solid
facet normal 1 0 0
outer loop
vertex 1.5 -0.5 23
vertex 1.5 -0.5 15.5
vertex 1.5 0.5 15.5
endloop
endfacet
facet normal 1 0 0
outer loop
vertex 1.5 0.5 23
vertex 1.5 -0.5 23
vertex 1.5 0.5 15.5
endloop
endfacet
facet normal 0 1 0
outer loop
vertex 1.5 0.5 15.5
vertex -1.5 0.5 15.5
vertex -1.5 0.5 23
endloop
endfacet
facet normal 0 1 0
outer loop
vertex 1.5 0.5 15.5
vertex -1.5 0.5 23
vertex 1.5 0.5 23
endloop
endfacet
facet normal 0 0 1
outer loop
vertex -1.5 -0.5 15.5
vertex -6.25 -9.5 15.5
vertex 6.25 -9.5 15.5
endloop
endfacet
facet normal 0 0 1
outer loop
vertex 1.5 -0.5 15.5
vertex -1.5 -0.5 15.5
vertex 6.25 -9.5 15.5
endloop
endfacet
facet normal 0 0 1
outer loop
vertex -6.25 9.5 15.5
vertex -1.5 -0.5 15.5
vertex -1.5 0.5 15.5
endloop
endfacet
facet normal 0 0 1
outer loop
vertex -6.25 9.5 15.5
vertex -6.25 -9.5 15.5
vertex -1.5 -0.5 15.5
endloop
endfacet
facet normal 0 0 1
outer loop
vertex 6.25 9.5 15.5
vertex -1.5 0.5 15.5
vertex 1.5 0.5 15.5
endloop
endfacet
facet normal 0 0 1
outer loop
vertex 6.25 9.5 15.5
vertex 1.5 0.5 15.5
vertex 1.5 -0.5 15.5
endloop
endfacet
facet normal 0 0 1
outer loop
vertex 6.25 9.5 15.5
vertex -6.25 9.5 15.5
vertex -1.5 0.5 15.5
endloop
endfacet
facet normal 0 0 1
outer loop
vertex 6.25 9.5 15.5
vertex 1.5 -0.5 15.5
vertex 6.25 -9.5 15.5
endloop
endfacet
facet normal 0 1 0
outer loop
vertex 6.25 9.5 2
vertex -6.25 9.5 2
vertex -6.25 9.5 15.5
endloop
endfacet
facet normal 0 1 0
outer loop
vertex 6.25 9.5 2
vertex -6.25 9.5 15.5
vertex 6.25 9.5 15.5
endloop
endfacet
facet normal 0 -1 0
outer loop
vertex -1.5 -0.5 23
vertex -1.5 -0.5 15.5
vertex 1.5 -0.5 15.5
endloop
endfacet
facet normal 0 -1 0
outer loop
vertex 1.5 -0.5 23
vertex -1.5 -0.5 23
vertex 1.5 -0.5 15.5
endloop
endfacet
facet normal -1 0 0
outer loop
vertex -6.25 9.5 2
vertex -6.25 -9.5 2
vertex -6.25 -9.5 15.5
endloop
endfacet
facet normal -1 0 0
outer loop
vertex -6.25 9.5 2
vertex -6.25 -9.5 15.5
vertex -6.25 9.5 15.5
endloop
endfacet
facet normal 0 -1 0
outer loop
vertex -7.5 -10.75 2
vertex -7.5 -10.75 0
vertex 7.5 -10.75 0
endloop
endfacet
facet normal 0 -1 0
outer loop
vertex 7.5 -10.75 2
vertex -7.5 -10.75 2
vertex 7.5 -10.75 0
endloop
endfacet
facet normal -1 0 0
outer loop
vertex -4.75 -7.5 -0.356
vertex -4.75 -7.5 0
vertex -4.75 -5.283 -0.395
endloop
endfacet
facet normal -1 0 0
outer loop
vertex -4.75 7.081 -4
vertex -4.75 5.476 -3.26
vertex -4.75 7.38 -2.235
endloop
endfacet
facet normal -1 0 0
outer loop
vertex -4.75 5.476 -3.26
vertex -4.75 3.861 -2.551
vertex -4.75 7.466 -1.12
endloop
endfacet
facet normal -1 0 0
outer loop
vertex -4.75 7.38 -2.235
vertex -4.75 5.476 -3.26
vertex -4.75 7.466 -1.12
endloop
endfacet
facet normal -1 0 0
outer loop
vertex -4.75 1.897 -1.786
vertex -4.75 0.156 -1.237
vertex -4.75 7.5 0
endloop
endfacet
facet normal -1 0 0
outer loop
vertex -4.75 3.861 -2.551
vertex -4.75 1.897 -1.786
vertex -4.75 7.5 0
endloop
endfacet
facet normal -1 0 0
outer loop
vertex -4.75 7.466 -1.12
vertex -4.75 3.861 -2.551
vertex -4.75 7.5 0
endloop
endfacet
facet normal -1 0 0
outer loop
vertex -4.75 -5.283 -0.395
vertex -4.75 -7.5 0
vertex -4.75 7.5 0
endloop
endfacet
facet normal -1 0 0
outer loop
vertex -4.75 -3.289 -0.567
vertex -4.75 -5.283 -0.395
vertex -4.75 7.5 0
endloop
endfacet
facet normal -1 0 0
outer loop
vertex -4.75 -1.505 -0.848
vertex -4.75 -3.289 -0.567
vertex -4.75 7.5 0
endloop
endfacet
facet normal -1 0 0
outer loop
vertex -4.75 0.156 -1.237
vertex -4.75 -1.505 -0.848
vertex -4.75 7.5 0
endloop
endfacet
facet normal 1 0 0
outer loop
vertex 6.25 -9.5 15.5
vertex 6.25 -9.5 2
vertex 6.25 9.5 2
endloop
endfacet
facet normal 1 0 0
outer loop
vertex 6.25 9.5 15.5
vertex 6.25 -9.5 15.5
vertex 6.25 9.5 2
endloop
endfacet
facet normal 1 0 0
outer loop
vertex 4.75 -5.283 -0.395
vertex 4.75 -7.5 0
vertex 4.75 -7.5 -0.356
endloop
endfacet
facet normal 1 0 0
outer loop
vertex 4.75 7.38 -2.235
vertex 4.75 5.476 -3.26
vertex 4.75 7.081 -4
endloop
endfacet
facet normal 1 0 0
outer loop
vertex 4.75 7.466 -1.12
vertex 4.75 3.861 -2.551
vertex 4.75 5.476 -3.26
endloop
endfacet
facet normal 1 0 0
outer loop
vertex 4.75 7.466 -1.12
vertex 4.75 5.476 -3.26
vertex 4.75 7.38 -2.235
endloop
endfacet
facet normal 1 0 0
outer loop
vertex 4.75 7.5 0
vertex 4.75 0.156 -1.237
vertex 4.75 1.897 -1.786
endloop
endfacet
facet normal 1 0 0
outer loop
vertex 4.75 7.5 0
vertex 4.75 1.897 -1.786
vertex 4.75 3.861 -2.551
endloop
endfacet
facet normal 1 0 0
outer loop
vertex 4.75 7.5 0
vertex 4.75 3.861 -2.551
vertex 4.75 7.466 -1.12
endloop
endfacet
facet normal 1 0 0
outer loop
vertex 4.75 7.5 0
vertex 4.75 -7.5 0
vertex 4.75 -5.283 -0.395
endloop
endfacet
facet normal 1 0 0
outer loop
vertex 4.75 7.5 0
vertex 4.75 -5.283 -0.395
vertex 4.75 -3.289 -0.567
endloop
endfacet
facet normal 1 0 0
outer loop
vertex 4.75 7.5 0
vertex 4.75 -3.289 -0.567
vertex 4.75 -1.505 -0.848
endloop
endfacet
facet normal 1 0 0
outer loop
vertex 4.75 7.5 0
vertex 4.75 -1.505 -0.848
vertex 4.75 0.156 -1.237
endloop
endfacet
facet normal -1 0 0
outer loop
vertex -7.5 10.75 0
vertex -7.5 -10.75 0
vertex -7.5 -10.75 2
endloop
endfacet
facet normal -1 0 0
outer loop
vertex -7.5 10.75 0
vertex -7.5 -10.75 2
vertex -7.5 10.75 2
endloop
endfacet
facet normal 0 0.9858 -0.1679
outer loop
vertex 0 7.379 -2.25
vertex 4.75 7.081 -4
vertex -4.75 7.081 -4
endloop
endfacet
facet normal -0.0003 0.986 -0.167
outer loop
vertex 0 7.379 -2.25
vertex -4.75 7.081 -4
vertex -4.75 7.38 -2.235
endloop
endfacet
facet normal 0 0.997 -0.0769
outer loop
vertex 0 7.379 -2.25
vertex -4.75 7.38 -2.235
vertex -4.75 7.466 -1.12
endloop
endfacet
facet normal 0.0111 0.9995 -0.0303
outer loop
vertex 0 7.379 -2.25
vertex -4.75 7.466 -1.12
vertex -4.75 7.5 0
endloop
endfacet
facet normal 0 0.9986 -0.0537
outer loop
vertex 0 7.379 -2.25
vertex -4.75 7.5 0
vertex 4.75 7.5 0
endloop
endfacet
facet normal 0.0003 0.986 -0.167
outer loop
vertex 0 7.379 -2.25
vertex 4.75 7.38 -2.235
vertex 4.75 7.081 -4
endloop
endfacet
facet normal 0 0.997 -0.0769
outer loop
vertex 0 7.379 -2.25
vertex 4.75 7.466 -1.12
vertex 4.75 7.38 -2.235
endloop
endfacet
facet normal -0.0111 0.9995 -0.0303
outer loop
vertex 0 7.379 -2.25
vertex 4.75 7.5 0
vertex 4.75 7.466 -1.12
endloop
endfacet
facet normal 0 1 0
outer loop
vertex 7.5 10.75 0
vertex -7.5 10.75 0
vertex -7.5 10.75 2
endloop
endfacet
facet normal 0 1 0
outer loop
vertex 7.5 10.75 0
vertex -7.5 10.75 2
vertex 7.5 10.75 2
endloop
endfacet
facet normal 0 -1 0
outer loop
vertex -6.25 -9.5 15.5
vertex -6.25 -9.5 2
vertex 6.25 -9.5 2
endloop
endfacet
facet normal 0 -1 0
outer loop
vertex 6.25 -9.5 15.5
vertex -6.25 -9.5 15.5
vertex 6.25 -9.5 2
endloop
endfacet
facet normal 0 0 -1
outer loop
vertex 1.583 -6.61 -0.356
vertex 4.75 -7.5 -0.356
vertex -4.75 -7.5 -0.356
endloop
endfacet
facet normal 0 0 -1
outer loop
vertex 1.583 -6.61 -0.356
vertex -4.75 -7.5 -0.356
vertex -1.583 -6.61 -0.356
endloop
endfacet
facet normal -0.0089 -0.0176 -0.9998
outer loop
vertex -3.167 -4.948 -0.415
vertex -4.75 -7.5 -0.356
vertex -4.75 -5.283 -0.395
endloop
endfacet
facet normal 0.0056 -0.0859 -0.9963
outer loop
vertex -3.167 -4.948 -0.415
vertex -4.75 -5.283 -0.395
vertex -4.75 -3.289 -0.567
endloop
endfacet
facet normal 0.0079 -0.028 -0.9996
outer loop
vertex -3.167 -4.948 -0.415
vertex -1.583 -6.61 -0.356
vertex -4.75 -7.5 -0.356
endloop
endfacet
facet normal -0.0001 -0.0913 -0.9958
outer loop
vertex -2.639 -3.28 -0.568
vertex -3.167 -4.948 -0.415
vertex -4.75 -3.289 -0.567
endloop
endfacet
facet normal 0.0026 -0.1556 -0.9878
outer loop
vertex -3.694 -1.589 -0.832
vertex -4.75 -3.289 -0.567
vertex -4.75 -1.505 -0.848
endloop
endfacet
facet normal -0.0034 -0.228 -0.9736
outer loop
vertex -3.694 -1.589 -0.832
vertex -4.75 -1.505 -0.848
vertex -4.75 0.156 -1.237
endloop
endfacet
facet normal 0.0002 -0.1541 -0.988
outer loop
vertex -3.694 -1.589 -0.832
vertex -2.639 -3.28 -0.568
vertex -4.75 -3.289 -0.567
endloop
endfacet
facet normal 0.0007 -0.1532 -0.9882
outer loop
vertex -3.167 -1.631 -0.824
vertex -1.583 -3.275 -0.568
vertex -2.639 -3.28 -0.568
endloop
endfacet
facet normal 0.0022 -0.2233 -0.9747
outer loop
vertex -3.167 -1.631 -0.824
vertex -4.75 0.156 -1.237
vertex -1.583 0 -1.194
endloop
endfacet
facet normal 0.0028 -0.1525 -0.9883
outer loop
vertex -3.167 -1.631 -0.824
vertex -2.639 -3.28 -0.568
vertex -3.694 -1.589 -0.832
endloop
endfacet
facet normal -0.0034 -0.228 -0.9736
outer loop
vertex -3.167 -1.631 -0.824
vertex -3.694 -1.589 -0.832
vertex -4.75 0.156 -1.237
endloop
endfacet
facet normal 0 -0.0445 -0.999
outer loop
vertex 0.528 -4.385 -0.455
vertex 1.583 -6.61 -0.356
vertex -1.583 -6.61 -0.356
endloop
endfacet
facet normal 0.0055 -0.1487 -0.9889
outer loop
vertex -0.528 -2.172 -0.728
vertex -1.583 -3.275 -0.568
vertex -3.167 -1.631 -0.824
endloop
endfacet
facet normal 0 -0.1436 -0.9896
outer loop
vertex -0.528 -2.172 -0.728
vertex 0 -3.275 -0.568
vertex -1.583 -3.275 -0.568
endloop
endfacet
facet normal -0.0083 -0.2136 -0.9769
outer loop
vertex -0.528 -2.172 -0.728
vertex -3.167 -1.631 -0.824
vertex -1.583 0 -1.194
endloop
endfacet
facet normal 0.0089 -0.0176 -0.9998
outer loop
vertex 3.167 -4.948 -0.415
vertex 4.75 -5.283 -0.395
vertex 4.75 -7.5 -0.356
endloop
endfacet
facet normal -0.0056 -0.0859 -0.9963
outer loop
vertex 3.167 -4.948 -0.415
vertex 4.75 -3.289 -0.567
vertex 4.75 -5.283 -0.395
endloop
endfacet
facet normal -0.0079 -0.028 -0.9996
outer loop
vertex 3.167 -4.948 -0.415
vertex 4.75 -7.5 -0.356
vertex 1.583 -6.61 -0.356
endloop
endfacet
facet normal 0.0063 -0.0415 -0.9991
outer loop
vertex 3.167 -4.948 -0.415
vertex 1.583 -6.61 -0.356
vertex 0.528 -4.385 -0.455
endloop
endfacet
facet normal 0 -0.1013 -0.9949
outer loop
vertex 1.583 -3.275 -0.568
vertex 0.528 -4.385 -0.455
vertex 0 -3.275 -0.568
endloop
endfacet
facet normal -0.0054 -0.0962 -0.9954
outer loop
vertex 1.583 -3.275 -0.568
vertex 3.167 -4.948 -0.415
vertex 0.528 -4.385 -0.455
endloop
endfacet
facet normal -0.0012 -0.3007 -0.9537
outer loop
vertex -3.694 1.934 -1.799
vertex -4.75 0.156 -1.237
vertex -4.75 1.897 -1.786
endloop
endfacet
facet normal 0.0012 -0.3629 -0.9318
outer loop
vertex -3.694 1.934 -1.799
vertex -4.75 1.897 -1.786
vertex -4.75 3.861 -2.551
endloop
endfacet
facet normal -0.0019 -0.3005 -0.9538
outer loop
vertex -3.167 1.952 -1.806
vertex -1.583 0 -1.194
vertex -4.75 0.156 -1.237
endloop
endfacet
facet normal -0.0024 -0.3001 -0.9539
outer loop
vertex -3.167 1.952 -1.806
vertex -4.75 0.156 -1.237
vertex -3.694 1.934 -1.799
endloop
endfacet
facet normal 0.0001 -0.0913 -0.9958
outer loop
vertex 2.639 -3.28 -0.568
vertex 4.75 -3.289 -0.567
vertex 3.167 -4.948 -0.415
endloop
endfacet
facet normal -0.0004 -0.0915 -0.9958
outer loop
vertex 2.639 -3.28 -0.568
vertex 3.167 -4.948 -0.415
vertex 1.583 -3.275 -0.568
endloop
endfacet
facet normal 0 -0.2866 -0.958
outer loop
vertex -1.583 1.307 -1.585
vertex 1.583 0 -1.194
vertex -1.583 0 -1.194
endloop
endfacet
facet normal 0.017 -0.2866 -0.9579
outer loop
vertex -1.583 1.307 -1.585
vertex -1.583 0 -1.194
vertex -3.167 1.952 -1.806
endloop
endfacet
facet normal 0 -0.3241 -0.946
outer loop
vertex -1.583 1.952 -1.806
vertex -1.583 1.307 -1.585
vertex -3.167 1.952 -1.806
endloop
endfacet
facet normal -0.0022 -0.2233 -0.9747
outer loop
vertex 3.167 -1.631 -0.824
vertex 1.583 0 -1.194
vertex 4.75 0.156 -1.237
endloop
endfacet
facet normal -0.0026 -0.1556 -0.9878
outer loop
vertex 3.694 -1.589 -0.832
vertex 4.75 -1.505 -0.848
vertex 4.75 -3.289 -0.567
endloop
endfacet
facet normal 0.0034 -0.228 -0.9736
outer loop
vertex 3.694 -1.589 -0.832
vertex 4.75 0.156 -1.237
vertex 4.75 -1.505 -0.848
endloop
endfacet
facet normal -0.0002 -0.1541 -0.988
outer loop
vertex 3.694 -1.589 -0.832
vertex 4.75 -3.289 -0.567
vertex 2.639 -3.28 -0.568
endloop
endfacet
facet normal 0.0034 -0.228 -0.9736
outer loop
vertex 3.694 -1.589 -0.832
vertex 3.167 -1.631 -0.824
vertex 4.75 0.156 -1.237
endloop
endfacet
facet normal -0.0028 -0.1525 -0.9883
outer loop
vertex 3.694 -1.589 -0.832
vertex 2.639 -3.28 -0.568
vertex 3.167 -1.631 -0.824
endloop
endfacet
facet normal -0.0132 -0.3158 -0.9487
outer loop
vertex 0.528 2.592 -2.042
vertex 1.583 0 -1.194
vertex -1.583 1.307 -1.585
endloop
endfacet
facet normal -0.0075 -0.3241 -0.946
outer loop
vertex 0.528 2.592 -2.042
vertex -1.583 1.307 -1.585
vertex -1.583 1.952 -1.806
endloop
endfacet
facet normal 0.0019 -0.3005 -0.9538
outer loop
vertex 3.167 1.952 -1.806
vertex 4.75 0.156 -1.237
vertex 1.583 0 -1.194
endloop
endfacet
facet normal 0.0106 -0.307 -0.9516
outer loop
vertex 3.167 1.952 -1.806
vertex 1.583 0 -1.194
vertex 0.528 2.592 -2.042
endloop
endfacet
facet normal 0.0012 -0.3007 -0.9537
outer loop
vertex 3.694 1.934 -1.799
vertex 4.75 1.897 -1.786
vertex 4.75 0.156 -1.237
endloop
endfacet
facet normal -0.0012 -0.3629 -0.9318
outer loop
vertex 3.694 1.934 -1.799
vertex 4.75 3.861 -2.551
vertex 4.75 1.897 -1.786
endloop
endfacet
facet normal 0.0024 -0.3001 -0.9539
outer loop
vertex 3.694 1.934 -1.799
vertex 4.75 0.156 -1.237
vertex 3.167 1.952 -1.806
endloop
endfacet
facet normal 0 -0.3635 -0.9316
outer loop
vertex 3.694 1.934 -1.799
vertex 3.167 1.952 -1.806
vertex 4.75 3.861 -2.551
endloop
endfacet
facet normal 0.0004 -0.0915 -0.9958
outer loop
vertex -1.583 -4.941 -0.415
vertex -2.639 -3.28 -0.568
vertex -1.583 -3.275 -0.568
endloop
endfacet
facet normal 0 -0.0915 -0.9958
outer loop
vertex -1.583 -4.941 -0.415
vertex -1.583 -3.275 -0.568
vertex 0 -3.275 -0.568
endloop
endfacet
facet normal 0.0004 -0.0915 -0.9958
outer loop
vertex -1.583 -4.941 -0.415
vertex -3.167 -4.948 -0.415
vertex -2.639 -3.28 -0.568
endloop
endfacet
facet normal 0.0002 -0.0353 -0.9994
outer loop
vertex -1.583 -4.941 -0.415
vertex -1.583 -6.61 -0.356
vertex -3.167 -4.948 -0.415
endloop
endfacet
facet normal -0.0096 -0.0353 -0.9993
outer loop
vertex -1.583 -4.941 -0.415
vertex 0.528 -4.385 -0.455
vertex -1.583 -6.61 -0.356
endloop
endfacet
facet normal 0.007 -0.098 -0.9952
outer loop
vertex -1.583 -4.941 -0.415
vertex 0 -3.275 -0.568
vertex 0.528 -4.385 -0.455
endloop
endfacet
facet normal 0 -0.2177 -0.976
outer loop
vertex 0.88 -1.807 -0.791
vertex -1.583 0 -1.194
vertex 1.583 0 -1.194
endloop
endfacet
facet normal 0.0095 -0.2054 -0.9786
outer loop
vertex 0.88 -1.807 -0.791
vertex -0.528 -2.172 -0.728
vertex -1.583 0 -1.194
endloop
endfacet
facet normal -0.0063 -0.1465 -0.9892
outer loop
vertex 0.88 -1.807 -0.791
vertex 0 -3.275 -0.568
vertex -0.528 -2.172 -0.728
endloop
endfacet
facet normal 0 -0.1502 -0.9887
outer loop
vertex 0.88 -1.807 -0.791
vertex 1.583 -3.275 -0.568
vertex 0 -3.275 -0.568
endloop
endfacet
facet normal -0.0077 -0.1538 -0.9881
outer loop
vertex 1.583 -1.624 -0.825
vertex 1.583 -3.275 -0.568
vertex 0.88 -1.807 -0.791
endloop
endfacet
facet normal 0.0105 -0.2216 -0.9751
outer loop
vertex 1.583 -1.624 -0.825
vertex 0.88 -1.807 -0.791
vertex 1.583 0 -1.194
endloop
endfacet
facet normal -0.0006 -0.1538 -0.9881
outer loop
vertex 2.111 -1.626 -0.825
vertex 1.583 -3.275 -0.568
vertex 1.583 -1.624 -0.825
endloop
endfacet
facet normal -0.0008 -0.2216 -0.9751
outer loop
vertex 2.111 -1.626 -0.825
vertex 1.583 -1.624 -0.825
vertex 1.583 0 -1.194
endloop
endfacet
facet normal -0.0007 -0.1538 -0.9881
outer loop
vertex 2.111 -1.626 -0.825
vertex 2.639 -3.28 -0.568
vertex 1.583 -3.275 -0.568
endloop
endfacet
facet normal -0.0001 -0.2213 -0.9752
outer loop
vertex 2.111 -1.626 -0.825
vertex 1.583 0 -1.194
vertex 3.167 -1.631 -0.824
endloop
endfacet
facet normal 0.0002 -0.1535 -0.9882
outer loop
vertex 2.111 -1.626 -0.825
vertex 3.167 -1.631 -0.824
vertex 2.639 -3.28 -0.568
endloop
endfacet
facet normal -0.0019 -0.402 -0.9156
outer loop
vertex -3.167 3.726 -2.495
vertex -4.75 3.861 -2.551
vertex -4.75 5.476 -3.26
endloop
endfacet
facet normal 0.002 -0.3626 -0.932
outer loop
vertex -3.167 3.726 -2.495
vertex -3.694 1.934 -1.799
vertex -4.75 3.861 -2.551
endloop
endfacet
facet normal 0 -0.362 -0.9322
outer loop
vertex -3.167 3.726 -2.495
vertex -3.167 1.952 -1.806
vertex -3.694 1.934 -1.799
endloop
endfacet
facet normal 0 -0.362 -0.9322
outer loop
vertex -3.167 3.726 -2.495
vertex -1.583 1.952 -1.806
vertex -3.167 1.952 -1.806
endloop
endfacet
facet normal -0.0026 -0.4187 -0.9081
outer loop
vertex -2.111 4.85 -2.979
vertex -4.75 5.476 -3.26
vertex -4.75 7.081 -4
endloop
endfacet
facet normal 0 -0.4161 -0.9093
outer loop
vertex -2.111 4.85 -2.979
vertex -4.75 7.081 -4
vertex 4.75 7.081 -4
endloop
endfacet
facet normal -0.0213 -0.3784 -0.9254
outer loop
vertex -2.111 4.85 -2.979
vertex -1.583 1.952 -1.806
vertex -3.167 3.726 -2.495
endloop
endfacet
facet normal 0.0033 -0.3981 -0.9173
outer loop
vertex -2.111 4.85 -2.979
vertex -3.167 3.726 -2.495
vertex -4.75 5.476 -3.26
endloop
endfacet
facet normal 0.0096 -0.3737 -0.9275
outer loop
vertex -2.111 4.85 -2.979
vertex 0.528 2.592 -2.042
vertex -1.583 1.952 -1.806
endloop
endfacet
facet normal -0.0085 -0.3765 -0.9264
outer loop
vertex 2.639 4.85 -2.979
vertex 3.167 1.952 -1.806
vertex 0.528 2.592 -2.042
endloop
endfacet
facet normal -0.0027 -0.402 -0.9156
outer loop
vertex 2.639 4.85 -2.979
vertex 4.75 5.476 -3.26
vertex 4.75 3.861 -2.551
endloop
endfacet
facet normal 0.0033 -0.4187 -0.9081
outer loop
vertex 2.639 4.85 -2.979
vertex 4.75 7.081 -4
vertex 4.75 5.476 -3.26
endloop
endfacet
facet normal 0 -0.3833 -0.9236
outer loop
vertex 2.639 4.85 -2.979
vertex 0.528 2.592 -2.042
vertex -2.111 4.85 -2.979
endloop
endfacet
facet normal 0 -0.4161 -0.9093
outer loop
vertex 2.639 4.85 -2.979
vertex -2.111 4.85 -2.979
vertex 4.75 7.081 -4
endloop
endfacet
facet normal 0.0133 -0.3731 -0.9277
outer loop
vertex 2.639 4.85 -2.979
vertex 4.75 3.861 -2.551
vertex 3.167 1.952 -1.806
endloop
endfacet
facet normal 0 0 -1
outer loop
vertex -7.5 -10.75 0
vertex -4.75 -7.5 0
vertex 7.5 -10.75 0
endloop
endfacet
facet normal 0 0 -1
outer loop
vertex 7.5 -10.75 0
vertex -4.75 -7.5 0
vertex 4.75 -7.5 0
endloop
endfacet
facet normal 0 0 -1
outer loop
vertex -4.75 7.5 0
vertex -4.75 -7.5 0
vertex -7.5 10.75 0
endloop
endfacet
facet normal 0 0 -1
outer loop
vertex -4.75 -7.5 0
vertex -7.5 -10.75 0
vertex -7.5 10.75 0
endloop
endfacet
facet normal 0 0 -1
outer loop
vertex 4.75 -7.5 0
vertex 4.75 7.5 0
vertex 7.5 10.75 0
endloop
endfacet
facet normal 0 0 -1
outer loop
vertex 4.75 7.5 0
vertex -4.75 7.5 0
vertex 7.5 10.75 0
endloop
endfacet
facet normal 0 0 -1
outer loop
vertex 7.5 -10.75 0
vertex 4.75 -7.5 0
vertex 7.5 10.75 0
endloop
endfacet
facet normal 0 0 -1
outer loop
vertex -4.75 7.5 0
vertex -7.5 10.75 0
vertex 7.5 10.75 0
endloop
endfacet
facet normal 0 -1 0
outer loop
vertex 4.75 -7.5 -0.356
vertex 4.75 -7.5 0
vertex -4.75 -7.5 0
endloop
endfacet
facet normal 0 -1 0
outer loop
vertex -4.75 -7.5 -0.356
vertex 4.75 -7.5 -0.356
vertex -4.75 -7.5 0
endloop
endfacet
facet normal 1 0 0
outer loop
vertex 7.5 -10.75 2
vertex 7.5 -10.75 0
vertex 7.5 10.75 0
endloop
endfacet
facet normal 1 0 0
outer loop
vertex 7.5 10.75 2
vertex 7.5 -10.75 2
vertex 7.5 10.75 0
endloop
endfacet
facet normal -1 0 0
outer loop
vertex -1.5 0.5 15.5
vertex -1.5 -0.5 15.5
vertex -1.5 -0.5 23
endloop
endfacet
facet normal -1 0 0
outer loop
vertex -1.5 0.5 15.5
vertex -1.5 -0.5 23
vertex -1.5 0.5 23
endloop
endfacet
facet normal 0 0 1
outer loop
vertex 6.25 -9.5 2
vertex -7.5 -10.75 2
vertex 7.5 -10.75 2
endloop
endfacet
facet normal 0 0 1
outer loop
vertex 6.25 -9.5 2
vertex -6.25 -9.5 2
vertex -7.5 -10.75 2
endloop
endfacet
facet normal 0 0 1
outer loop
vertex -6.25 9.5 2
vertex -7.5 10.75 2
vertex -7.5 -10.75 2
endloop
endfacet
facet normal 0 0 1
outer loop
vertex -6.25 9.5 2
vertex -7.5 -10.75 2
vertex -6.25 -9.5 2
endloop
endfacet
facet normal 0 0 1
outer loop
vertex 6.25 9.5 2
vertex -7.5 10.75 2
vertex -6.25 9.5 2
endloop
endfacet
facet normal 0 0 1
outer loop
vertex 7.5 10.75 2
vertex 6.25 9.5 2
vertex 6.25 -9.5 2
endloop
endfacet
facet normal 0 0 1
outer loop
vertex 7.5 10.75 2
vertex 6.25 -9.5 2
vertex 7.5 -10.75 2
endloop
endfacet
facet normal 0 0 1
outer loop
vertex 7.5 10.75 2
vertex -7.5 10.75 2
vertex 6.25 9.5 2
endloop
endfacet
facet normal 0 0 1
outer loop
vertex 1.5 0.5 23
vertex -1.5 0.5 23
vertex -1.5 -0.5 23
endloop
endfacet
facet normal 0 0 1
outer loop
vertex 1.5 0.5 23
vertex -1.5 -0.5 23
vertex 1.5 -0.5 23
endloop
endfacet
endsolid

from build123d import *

# Parameters (mm, degrees)
SKETCH_1_W          = 15
SKETCH_1_H          = 21.5
EXTRUDE_1_DEPTH     = 2
SKETCH_2_W          = 12.5
SKETCH_2_H          = 19
EXTRUDE_2_DEPTH     = 13.5
SKETCH_3_W          = 9.5
SKETCH_3_H          = 15
EXTRUDE_3_DEPTH     = 4
CUT_EXTRUDE_START   = -9.5
CUT_EXTRUDE_1_DEPTH = 9.5
SKETCH_6_W          = 3
SKETCH_6_H          = 1
EXTRUDE_1_2_DEPTH   = 7.5


# Read off the part's stored shape, not the designer's step: 切除-拉伸1
with BuildPart() as part:
    # 草图1 → Extrude 1 (new body)
    with BuildSketch(Plane.XY):
        Rectangle(SKETCH_1_W, SKETCH_1_H)
    extrude(amount=EXTRUDE_1_DEPTH)

    # 草图2 → 拉伸2 (add)
    with BuildSketch(Plane.XY.offset(2)):
        Rectangle(SKETCH_2_W, SKETCH_2_H)
    extrude(amount=EXTRUDE_2_DEPTH)

    # 草图3 → 拉伸3 (add)
    with BuildSketch(Plane(origin=(0, 0, 0), x_dir=(-1, 0, 0), z_dir=(0, 0, -1))):
        Rectangle(SKETCH_3_W, SKETCH_3_H)
    extrude(amount=EXTRUDE_3_DEPTH)

    # 切除-拉伸1 outline → 切除-拉伸1 (cut)
    with BuildSketch(Plane.ZY.offset(4.75).offset(CUT_EXTRUDE_START)):
        with BuildLine():
            Line((-4, -7.5), (-0.355698538, -7.5))
            add(Edge.make_bspline(
                [(-0.355698538, -7.5), (-0.354349182, -7.203584733), (-0.342893084, -4.687006069), (-0.90591647, 0.423075599), (-2.923742076, 4.765110149), (-4, 7.081043238)],
                knots=[0, 0, 0, 0, 0.058645761, 0.497905094, 1, 1, 1, 1], degree=3))
            Line((-4, 7.081043238), (-4, -7.5))
        make_face()
        with BuildLine():
            Line((-4, 7.5), (-4, 7.081043238))
            add(Edge.make_bspline(
                [(-4, 7.081043238), (-3.418318642, 7.19501669), (-2.098267317, 7.453664838), (-0.752663012, 7.483379257), (0, 7.5)],
                knots=[0, 0, 0, 0, 0.440650562, 1, 1, 1, 1], degree=3))
            Line((0, 7.5), (-4, 7.5))
        make_face()
    extrude(amount=CUT_EXTRUDE_1_DEPTH, mode=Mode.SUBTRACT)

    # 草图6 → Extrude 1 2 (add)
    with BuildSketch(Plane.XY.offset(15.5)):
        Rectangle(SKETCH_6_W, SKETCH_6_H)
    extrude(amount=EXTRUDE_1_2_DEPTH)


solid = part.part
